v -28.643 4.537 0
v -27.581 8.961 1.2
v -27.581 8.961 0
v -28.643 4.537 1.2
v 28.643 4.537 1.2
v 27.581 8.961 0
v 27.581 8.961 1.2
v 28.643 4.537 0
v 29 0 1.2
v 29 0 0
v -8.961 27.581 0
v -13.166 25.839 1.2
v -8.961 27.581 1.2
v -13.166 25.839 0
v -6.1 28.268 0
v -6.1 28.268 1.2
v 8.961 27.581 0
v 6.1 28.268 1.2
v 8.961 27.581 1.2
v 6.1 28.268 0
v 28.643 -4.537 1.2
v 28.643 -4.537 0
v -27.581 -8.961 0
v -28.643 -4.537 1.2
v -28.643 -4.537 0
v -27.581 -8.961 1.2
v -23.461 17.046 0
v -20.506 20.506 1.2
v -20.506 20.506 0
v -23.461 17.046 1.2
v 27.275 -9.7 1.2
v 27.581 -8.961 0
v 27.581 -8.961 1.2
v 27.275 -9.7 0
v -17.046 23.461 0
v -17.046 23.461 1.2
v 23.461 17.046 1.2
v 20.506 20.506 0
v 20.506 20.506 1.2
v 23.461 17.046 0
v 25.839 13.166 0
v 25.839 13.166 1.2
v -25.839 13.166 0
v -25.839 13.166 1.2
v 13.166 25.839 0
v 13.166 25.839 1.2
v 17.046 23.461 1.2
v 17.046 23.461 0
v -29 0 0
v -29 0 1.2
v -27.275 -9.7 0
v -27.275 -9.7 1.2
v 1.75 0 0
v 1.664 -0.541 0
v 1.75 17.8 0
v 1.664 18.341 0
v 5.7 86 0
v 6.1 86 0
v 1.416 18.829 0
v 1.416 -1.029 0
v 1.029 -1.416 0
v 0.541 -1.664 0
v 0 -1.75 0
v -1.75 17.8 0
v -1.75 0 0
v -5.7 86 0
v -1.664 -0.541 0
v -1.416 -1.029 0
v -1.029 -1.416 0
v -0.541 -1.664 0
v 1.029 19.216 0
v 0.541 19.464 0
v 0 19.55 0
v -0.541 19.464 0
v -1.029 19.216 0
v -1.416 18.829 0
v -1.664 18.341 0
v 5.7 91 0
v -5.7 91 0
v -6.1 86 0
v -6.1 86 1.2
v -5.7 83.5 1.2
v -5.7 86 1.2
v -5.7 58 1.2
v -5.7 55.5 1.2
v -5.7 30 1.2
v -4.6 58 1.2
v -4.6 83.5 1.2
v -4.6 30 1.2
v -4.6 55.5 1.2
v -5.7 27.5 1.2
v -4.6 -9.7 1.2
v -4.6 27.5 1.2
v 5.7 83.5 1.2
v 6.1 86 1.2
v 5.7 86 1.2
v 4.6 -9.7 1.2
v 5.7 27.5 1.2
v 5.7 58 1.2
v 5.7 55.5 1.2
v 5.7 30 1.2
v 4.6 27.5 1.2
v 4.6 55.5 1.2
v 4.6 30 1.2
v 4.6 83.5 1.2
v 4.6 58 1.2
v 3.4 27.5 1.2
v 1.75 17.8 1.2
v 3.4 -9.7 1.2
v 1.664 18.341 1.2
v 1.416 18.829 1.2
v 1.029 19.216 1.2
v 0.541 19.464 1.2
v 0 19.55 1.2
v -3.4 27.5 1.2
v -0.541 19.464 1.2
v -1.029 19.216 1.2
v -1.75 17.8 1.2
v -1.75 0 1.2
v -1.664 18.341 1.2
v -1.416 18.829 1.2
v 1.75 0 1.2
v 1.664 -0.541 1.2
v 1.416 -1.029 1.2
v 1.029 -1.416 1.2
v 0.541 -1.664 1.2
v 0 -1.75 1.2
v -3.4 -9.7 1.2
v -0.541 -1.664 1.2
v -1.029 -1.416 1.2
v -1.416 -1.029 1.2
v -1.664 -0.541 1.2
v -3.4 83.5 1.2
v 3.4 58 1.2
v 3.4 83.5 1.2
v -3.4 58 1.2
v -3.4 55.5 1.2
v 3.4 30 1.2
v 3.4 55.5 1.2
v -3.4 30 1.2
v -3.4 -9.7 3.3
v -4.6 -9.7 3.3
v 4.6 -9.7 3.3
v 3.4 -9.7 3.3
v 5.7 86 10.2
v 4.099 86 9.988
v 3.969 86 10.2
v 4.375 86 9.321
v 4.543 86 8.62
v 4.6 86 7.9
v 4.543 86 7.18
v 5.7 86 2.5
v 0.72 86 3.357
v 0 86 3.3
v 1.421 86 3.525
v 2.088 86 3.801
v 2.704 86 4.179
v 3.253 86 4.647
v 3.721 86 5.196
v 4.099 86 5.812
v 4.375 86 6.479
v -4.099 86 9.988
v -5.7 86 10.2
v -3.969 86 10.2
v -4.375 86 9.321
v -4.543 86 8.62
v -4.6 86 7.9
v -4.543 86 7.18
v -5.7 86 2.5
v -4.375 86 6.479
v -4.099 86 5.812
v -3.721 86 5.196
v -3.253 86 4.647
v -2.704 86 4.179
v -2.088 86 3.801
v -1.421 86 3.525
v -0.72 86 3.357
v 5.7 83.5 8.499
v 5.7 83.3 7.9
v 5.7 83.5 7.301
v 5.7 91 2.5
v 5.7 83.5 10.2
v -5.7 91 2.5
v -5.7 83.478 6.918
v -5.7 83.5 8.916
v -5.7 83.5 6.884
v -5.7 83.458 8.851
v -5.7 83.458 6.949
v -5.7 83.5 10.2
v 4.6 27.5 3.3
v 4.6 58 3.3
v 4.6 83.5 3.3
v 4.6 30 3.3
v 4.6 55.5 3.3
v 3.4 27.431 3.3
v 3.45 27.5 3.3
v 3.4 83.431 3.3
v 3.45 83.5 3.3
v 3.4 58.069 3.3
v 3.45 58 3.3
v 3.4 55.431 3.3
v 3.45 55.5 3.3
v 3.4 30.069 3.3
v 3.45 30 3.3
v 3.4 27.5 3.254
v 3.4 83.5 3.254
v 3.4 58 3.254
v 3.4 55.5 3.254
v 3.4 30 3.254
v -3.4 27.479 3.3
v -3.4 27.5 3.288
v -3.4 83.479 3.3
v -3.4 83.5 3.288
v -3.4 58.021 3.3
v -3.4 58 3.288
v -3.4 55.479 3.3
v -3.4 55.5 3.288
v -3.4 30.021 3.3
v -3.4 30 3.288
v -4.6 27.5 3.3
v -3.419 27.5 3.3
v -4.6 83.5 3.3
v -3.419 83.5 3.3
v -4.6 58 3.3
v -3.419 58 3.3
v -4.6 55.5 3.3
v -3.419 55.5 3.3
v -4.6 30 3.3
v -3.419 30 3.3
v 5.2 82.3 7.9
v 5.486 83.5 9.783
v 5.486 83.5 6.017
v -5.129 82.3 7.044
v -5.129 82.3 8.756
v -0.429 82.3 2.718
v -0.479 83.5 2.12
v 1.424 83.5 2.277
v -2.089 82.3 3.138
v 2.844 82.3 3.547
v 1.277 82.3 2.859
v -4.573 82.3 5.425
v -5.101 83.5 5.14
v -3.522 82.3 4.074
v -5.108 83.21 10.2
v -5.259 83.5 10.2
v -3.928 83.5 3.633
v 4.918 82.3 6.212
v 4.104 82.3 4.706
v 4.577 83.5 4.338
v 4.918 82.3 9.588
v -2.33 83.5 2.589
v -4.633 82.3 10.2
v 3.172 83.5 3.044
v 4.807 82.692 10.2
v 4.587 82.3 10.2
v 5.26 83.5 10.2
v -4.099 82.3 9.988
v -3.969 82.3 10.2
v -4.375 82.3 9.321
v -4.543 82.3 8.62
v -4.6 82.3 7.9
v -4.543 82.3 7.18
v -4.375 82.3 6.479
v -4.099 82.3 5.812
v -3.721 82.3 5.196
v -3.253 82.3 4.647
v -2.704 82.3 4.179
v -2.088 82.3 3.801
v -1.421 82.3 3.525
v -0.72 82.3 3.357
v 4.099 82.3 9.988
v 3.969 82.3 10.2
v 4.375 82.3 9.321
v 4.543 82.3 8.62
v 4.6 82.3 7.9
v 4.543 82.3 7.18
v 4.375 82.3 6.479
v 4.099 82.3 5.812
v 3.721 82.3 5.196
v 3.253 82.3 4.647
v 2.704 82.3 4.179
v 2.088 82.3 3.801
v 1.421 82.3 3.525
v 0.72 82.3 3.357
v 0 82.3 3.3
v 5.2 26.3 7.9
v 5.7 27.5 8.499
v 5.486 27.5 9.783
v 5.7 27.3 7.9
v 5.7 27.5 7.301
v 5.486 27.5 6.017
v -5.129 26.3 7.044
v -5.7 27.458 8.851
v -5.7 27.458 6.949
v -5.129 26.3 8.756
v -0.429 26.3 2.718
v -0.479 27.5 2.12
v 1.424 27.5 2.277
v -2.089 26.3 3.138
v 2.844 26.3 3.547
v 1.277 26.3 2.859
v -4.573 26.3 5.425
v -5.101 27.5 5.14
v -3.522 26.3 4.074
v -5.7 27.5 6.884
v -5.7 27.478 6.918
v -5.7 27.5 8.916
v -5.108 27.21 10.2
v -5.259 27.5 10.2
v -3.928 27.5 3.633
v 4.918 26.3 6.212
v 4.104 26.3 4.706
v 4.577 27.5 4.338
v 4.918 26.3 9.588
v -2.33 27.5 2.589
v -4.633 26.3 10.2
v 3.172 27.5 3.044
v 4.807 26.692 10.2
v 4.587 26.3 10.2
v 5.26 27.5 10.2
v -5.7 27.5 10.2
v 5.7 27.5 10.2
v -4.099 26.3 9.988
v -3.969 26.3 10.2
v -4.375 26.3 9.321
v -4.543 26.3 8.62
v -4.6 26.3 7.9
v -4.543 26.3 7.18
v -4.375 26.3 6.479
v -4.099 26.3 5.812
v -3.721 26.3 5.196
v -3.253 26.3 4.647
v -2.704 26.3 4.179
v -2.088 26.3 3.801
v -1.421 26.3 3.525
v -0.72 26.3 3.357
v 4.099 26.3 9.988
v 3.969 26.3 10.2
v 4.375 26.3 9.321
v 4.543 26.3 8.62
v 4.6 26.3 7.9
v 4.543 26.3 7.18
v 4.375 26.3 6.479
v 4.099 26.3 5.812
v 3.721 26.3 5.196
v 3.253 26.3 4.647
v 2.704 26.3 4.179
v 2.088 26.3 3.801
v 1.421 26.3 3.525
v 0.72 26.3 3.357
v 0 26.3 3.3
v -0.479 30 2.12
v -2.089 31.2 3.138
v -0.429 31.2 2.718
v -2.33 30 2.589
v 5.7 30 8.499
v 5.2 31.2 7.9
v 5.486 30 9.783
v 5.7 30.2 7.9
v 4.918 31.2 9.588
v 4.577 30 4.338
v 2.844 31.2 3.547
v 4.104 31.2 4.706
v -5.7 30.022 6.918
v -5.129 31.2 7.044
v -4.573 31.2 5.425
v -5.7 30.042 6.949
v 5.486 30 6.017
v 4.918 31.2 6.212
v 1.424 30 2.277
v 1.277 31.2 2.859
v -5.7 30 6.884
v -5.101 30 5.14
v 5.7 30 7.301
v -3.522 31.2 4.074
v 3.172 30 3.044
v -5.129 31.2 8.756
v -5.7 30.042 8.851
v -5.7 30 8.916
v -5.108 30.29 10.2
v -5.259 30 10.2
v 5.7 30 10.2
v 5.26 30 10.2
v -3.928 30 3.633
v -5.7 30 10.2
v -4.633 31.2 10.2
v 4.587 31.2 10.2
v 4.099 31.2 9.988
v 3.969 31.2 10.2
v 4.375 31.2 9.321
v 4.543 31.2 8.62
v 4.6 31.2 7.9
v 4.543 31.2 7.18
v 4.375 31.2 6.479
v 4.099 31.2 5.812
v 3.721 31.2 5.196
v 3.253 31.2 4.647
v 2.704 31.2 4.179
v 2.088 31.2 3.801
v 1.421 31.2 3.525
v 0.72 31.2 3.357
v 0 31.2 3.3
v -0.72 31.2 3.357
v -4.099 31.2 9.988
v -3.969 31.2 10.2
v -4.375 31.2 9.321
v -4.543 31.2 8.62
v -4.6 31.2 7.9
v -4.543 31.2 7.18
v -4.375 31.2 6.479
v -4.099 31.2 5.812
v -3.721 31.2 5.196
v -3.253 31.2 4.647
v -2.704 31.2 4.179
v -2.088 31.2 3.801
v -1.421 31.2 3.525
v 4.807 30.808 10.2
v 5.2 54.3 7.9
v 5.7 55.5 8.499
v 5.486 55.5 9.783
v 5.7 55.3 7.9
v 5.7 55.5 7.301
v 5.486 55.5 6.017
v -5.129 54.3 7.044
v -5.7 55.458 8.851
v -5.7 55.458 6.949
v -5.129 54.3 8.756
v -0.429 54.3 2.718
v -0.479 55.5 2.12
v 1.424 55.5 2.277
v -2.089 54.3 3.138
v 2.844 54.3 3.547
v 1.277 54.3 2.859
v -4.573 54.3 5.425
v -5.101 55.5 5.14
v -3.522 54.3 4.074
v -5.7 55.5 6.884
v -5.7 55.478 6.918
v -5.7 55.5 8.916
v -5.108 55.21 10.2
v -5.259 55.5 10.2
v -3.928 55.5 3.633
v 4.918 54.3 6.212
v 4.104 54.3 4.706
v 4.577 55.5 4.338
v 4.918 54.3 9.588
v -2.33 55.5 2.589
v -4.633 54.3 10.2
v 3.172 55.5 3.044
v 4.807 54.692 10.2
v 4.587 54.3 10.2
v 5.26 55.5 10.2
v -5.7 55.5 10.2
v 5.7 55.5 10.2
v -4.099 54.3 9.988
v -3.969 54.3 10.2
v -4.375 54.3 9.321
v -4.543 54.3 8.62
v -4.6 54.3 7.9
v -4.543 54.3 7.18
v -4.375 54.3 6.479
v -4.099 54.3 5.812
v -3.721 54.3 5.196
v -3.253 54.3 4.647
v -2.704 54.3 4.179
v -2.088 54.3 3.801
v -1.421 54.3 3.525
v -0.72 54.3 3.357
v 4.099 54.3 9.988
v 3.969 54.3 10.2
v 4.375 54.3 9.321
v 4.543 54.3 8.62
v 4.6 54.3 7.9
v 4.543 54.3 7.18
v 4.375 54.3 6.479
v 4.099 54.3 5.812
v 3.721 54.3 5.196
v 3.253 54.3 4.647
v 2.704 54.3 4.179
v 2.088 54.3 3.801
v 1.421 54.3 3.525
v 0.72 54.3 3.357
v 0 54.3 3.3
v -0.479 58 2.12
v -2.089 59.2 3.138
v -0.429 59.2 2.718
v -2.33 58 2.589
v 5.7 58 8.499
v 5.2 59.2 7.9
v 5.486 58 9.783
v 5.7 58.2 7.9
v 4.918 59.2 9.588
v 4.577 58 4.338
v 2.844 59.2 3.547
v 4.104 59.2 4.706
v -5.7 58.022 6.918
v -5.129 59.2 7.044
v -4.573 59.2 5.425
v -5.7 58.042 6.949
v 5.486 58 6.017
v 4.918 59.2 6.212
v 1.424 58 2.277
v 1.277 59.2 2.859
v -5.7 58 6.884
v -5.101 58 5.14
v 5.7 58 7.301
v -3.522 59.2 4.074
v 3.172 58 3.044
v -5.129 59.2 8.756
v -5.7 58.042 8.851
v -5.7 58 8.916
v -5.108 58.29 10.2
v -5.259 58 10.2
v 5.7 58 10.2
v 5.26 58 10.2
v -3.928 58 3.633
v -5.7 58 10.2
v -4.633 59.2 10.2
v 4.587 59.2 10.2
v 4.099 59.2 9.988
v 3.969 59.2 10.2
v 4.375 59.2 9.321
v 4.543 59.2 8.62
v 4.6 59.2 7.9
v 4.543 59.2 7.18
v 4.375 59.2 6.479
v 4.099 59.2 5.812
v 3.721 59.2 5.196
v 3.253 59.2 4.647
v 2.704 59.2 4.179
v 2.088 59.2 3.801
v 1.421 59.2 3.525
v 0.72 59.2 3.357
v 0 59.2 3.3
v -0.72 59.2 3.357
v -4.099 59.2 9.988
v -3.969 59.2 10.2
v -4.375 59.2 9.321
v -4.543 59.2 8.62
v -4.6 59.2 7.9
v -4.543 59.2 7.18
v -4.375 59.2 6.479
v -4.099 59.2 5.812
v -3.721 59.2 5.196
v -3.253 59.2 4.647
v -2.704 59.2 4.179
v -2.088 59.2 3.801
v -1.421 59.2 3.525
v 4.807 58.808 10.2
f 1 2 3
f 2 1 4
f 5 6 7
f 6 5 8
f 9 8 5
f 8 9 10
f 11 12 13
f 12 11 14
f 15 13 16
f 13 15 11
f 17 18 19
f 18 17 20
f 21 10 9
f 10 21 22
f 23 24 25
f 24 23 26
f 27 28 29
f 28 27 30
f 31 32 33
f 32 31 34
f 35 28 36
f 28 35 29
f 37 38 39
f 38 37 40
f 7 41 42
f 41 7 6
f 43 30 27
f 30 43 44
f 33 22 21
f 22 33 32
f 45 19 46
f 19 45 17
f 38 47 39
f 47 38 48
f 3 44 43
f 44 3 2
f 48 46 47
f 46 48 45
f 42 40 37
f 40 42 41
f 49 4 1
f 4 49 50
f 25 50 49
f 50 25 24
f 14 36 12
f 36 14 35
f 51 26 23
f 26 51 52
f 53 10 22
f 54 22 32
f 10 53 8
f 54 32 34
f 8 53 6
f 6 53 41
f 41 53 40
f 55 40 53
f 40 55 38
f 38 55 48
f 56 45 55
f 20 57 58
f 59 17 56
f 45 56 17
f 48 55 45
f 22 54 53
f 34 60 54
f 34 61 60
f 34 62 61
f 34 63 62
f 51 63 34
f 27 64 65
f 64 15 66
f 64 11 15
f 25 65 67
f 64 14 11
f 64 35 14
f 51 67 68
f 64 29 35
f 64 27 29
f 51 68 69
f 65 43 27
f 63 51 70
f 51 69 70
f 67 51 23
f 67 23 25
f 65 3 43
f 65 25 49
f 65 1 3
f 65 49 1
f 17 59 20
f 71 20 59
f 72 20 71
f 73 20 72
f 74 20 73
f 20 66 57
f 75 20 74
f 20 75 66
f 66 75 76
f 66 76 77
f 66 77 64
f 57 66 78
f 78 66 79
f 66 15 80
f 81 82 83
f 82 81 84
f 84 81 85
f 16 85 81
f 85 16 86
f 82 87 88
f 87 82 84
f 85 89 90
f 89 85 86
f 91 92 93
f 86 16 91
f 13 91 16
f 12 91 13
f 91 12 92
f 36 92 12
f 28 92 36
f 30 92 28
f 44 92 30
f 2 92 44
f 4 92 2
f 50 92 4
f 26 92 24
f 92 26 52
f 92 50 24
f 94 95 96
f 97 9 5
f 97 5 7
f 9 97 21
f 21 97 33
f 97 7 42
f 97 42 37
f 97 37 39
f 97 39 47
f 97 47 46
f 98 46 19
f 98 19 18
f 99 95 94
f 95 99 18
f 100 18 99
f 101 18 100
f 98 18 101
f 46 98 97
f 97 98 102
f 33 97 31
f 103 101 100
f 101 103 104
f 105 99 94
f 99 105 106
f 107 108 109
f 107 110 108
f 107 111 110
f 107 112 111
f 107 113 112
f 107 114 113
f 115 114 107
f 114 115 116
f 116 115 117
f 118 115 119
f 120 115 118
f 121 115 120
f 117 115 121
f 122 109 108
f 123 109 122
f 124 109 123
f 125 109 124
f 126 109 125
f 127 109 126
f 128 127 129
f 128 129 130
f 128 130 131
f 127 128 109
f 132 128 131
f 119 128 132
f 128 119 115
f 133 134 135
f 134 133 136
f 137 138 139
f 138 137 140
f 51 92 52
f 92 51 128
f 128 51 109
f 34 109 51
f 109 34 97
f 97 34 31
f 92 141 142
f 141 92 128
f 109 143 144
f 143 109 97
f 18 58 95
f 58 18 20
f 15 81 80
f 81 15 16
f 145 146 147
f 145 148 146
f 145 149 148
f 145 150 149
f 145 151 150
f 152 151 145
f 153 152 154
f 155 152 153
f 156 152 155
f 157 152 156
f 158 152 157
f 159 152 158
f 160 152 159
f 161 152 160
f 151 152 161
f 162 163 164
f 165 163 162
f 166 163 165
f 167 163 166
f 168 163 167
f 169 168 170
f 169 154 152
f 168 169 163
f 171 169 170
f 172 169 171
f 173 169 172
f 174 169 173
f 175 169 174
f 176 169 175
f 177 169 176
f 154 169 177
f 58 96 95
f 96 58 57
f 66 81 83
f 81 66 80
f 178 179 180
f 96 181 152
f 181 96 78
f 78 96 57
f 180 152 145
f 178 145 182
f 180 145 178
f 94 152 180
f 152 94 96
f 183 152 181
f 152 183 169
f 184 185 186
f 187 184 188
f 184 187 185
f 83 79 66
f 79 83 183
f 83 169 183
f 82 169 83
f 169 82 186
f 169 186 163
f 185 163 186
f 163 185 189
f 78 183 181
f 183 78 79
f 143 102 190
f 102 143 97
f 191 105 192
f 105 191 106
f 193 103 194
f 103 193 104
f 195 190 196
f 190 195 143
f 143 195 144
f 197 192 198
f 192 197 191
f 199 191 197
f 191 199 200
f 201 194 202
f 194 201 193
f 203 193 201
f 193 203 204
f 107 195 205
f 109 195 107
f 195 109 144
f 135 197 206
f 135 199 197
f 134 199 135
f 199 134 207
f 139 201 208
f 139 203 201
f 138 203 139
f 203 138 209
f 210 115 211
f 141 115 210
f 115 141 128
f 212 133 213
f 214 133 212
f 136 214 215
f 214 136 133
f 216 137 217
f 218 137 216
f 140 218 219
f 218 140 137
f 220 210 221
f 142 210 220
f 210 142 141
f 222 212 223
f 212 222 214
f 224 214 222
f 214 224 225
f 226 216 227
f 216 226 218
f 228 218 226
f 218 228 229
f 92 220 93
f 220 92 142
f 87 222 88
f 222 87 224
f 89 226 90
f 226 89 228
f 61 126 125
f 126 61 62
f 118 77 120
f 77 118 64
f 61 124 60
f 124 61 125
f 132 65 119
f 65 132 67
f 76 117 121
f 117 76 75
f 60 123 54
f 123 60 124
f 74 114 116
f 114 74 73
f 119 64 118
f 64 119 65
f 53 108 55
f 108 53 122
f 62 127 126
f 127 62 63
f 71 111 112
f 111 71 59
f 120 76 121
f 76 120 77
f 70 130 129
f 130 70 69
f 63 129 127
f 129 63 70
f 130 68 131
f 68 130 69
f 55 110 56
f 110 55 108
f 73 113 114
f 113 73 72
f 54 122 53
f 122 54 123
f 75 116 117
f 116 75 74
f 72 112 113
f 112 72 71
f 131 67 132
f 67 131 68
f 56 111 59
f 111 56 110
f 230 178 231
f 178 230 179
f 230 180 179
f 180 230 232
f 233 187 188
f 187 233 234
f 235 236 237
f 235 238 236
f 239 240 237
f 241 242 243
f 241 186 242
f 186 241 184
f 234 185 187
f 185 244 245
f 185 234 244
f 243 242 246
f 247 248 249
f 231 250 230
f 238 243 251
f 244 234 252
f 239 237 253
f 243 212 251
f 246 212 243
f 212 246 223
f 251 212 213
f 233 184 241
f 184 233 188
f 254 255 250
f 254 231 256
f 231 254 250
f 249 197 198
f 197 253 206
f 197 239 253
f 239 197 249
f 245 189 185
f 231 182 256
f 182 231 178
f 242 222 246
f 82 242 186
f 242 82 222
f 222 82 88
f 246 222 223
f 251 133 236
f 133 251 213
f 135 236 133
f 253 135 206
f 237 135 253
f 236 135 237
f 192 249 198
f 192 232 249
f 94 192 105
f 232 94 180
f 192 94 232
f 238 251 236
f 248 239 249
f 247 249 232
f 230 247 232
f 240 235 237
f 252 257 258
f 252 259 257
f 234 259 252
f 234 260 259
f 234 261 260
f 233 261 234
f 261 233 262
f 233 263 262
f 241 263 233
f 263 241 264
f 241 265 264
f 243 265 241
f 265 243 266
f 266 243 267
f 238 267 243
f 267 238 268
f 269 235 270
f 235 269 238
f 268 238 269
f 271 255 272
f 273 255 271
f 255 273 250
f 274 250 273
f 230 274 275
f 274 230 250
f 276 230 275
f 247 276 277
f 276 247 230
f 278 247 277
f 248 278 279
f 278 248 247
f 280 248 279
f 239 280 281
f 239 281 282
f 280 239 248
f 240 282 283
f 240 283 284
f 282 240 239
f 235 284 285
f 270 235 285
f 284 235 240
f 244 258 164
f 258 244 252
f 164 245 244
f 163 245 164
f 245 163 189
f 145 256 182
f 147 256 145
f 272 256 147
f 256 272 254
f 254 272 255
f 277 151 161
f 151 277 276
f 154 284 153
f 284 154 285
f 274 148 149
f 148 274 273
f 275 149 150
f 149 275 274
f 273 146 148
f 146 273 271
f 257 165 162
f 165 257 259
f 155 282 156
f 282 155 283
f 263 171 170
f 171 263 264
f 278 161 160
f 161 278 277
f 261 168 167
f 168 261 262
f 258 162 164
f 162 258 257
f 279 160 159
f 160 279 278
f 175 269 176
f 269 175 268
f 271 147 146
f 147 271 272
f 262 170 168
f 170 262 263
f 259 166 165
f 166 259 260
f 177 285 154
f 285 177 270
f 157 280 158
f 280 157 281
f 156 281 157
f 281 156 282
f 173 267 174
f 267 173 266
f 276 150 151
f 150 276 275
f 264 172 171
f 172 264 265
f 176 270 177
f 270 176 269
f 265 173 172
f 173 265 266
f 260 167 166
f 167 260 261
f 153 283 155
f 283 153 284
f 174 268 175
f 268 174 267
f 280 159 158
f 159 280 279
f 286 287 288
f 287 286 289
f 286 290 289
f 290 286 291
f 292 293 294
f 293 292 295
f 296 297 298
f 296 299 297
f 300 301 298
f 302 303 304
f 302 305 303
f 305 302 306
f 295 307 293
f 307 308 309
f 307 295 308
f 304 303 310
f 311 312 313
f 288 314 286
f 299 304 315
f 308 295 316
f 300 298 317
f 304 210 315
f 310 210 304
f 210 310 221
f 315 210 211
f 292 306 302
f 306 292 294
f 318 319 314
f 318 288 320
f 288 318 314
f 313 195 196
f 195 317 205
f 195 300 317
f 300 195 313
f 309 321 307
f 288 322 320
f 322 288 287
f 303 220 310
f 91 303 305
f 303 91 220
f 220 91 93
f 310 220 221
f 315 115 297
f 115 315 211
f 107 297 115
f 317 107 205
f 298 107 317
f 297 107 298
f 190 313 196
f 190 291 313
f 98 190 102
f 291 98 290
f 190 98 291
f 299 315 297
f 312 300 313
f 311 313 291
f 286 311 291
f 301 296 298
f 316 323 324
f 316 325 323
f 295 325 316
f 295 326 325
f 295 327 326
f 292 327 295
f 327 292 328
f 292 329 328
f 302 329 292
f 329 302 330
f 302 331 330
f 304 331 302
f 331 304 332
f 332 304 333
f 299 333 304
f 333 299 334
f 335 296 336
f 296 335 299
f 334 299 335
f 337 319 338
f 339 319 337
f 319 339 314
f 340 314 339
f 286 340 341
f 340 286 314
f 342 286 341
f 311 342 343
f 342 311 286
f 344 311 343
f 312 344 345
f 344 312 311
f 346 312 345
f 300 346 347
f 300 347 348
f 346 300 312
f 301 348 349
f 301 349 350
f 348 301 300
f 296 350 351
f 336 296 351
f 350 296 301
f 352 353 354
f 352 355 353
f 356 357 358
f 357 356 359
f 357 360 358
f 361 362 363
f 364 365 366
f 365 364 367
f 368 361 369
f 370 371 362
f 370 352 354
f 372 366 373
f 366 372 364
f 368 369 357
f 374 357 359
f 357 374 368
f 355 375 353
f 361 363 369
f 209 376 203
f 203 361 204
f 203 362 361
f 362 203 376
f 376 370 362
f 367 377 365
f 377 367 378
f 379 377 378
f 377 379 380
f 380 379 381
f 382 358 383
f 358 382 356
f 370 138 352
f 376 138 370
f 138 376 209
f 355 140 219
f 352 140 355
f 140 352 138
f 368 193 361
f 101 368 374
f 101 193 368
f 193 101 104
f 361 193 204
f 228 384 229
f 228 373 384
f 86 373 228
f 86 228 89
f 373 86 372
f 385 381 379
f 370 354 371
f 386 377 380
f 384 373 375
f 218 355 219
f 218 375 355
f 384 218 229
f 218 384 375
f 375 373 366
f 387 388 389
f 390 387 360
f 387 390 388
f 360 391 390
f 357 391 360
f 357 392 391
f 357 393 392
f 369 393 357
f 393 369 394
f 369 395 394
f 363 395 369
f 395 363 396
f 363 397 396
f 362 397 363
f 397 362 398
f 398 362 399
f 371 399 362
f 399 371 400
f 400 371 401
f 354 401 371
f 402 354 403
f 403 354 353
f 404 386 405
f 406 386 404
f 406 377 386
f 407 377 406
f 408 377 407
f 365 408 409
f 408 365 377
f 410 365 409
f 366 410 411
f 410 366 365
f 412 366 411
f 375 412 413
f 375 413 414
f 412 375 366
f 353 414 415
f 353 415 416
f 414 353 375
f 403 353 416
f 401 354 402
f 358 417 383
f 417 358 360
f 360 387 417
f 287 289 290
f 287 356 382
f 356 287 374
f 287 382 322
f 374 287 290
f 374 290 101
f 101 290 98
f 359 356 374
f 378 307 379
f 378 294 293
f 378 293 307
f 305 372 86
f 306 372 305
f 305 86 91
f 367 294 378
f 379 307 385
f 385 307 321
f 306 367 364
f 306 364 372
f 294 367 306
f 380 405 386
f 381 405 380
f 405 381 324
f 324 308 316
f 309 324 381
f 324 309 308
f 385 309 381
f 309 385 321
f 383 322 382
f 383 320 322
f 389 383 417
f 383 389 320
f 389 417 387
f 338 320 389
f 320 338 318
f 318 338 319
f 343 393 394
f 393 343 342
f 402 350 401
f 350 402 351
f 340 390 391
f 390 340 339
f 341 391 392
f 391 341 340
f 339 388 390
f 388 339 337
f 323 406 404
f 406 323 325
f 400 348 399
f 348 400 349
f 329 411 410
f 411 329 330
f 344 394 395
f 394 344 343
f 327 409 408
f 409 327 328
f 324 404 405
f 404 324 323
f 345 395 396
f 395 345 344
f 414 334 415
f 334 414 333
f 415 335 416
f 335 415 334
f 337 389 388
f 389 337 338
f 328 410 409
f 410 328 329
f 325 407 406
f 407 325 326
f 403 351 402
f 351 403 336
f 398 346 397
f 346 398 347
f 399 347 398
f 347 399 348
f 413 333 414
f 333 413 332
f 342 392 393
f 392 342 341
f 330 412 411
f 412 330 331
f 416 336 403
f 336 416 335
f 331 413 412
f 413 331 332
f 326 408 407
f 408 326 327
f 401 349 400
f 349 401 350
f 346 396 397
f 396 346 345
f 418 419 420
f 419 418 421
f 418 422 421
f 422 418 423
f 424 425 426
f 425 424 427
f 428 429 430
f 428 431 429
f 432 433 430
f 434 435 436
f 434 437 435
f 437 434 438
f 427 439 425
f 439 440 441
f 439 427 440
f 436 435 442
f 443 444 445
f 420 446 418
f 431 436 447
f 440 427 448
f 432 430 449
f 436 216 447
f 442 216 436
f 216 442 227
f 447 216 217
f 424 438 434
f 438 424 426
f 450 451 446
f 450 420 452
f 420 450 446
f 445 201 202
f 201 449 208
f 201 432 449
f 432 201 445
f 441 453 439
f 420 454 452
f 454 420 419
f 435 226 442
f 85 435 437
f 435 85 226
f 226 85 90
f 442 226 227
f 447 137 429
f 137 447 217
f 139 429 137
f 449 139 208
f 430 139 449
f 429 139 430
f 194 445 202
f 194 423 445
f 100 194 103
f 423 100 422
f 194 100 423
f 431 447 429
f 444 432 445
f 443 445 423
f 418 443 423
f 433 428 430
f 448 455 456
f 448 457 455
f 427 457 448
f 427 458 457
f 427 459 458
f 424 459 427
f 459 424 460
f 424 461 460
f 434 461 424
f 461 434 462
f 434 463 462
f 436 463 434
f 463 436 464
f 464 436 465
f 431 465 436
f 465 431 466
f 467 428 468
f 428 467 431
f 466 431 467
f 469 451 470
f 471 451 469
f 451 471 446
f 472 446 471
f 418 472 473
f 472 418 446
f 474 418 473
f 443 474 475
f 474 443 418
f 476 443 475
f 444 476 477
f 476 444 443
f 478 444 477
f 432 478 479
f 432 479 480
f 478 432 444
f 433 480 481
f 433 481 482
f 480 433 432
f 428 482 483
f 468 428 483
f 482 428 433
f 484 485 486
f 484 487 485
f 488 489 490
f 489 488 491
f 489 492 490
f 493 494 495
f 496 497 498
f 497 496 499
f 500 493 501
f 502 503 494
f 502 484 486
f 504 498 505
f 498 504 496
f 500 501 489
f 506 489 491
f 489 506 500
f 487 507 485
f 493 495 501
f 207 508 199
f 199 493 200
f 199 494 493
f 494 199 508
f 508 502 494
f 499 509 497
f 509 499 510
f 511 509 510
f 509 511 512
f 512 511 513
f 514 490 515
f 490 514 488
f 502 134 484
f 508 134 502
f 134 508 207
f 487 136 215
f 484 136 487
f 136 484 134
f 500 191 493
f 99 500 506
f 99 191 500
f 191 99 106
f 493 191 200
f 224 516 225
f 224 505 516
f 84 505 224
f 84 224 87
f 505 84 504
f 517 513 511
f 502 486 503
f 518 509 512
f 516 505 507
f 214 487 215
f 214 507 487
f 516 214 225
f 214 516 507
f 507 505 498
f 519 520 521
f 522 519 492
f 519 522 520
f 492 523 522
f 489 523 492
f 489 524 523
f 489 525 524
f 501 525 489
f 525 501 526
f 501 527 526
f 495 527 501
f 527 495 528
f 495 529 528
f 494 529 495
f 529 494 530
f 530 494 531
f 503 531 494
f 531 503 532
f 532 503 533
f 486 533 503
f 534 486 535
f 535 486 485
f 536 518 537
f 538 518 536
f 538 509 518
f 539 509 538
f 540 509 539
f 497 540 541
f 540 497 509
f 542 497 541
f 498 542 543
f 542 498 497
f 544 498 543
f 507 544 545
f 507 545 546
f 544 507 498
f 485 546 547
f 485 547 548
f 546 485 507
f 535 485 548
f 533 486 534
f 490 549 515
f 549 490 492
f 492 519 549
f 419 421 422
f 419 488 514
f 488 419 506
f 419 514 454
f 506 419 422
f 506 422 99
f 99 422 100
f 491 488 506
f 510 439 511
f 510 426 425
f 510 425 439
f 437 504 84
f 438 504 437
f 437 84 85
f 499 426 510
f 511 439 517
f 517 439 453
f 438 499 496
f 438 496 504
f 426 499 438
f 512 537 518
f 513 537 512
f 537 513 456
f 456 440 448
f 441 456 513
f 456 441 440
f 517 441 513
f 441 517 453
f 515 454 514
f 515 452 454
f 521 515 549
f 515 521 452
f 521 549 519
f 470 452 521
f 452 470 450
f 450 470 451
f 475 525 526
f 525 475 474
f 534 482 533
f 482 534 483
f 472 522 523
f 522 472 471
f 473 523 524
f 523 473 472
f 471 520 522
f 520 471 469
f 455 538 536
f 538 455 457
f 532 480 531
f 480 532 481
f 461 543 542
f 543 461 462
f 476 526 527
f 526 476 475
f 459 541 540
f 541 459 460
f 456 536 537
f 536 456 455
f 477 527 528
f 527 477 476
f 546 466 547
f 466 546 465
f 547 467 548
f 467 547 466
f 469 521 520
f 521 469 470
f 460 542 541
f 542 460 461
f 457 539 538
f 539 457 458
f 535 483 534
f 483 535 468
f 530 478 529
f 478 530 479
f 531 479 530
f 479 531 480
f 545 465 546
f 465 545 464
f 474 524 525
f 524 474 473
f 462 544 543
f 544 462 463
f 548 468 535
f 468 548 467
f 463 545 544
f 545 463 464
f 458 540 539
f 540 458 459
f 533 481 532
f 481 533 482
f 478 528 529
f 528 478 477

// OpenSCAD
//
//  Door for retractable landing wheel (in wing)
//
//  Design by Egil Kvaleberg, 31 January 2015
//

// door extra overlap around leg and wheels
margin = 1.5;

// main door wall thickness
wall = 1.2;

// diameter of strut leg
leg_dia = 9.2;
// distance from top of leg to wheel centre
leg_len = 86.0;

// diameter of wheel
wheel_dia = 55.0;

// extra tab above top of leg, 0 if none
leg_extra = 5.0;
// width of extra tab, also decides width of clips
leg_extra_width = 11.4;
// wall thickness of extra tab
leg_extra_wall = 2.5;

// wall thickness of clips that fastens door to leg
cwall = 2.5;

// relative size of leg clip flex section, from 0.0 to 0.5
clip_size = 0.25;

// distance from surface of door to center of leg
surface_to_c = 7.9;

// length of wheel spring action
sprung_len = 17.8;

// diameter of wheel axle, 0 if it does not protrude through door
axle_dia = 3.5;

d = 1*0.01;

module clip(is_top) {
	rotate ([90, 0, 0]) difference () {
		union () {
			translate([-leg_extra_width/2, 0, -cwall/2]) cube([leg_extra_width, surface_to_c + clip_size*leg_dia, cwall]);
			intersection () { // extra rim
				union () {
					translate([0, surface_to_c, cwall/2]) cylinder(r1=leg_dia/2+wall, r2=leg_dia/2+wall/2, h=wall);
					if (!is_top) translate([0, surface_to_c, -cwall/2-wall]) cylinder(r2=leg_dia/2+wall, r1=leg_dia/2+wall/2, h=wall);
				}
				translate([-leg_extra_width/2, 0, -cwall/2-wall-d]) cube([leg_extra_width, surface_to_c + clip_size*leg_dia, cwall+2*wall+2*d]);
			}
		}
		translate([0, surface_to_c, -cwall/2-wall-d]) cylinder(r=leg_dia/2, h=cwall+2*wall+2*d, $fn=40);
	}
}

module cover() {
	difference () { 
		union () {
			translate([-leg_dia/2 - margin, 0, 0]) cube([2*margin+leg_dia, leg_len, wall]);
			translate([-leg_extra_width/2, leg_len, 0]) cube([leg_extra_width, leg_extra, leg_extra_wall]);

			// 2 strengthening bars
			translate([leg_dia/2 - wall, -wheel_dia/2 + sprung_len, 0]) cube([wall, leg_len + wheel_dia/2-sprung_len, surface_to_c-leg_dia/2]);
			translate([-leg_dia/2, -wheel_dia/2 + sprung_len, 0]) cube([wall, leg_len + wheel_dia/2-sprung_len, surface_to_c-leg_dia/2]);
			intersection () {
				cylinder(r=wheel_dia/2 + margin, h=wall, $fn=40);
				translate([-wheel_dia/2 - margin -d, sprung_len-wheel_dia/2, -d]) cube([2*margin+wheel_dia+2*d, 2*margin+wheel_dia, wall+2*d]);
			}
		}
		hull () {
			translate ([0,0,-d]) cylinder(r=axle_dia/2, h=wall+2*d, $fn=20);
			translate ([0,sprung_len,-d]) cylinder(r=axle_dia/2, h=wall+2*d, $fn=20);
		}
	}
}

cover();
translate ([0, leg_len-cwall/2, 0]) clip(true);
translate ([0, wheel_dia/2+cwall/2, 0]) clip(false);
translate ([0, (leg_len+wheel_dia/2)/2, 0]) clip(false);
